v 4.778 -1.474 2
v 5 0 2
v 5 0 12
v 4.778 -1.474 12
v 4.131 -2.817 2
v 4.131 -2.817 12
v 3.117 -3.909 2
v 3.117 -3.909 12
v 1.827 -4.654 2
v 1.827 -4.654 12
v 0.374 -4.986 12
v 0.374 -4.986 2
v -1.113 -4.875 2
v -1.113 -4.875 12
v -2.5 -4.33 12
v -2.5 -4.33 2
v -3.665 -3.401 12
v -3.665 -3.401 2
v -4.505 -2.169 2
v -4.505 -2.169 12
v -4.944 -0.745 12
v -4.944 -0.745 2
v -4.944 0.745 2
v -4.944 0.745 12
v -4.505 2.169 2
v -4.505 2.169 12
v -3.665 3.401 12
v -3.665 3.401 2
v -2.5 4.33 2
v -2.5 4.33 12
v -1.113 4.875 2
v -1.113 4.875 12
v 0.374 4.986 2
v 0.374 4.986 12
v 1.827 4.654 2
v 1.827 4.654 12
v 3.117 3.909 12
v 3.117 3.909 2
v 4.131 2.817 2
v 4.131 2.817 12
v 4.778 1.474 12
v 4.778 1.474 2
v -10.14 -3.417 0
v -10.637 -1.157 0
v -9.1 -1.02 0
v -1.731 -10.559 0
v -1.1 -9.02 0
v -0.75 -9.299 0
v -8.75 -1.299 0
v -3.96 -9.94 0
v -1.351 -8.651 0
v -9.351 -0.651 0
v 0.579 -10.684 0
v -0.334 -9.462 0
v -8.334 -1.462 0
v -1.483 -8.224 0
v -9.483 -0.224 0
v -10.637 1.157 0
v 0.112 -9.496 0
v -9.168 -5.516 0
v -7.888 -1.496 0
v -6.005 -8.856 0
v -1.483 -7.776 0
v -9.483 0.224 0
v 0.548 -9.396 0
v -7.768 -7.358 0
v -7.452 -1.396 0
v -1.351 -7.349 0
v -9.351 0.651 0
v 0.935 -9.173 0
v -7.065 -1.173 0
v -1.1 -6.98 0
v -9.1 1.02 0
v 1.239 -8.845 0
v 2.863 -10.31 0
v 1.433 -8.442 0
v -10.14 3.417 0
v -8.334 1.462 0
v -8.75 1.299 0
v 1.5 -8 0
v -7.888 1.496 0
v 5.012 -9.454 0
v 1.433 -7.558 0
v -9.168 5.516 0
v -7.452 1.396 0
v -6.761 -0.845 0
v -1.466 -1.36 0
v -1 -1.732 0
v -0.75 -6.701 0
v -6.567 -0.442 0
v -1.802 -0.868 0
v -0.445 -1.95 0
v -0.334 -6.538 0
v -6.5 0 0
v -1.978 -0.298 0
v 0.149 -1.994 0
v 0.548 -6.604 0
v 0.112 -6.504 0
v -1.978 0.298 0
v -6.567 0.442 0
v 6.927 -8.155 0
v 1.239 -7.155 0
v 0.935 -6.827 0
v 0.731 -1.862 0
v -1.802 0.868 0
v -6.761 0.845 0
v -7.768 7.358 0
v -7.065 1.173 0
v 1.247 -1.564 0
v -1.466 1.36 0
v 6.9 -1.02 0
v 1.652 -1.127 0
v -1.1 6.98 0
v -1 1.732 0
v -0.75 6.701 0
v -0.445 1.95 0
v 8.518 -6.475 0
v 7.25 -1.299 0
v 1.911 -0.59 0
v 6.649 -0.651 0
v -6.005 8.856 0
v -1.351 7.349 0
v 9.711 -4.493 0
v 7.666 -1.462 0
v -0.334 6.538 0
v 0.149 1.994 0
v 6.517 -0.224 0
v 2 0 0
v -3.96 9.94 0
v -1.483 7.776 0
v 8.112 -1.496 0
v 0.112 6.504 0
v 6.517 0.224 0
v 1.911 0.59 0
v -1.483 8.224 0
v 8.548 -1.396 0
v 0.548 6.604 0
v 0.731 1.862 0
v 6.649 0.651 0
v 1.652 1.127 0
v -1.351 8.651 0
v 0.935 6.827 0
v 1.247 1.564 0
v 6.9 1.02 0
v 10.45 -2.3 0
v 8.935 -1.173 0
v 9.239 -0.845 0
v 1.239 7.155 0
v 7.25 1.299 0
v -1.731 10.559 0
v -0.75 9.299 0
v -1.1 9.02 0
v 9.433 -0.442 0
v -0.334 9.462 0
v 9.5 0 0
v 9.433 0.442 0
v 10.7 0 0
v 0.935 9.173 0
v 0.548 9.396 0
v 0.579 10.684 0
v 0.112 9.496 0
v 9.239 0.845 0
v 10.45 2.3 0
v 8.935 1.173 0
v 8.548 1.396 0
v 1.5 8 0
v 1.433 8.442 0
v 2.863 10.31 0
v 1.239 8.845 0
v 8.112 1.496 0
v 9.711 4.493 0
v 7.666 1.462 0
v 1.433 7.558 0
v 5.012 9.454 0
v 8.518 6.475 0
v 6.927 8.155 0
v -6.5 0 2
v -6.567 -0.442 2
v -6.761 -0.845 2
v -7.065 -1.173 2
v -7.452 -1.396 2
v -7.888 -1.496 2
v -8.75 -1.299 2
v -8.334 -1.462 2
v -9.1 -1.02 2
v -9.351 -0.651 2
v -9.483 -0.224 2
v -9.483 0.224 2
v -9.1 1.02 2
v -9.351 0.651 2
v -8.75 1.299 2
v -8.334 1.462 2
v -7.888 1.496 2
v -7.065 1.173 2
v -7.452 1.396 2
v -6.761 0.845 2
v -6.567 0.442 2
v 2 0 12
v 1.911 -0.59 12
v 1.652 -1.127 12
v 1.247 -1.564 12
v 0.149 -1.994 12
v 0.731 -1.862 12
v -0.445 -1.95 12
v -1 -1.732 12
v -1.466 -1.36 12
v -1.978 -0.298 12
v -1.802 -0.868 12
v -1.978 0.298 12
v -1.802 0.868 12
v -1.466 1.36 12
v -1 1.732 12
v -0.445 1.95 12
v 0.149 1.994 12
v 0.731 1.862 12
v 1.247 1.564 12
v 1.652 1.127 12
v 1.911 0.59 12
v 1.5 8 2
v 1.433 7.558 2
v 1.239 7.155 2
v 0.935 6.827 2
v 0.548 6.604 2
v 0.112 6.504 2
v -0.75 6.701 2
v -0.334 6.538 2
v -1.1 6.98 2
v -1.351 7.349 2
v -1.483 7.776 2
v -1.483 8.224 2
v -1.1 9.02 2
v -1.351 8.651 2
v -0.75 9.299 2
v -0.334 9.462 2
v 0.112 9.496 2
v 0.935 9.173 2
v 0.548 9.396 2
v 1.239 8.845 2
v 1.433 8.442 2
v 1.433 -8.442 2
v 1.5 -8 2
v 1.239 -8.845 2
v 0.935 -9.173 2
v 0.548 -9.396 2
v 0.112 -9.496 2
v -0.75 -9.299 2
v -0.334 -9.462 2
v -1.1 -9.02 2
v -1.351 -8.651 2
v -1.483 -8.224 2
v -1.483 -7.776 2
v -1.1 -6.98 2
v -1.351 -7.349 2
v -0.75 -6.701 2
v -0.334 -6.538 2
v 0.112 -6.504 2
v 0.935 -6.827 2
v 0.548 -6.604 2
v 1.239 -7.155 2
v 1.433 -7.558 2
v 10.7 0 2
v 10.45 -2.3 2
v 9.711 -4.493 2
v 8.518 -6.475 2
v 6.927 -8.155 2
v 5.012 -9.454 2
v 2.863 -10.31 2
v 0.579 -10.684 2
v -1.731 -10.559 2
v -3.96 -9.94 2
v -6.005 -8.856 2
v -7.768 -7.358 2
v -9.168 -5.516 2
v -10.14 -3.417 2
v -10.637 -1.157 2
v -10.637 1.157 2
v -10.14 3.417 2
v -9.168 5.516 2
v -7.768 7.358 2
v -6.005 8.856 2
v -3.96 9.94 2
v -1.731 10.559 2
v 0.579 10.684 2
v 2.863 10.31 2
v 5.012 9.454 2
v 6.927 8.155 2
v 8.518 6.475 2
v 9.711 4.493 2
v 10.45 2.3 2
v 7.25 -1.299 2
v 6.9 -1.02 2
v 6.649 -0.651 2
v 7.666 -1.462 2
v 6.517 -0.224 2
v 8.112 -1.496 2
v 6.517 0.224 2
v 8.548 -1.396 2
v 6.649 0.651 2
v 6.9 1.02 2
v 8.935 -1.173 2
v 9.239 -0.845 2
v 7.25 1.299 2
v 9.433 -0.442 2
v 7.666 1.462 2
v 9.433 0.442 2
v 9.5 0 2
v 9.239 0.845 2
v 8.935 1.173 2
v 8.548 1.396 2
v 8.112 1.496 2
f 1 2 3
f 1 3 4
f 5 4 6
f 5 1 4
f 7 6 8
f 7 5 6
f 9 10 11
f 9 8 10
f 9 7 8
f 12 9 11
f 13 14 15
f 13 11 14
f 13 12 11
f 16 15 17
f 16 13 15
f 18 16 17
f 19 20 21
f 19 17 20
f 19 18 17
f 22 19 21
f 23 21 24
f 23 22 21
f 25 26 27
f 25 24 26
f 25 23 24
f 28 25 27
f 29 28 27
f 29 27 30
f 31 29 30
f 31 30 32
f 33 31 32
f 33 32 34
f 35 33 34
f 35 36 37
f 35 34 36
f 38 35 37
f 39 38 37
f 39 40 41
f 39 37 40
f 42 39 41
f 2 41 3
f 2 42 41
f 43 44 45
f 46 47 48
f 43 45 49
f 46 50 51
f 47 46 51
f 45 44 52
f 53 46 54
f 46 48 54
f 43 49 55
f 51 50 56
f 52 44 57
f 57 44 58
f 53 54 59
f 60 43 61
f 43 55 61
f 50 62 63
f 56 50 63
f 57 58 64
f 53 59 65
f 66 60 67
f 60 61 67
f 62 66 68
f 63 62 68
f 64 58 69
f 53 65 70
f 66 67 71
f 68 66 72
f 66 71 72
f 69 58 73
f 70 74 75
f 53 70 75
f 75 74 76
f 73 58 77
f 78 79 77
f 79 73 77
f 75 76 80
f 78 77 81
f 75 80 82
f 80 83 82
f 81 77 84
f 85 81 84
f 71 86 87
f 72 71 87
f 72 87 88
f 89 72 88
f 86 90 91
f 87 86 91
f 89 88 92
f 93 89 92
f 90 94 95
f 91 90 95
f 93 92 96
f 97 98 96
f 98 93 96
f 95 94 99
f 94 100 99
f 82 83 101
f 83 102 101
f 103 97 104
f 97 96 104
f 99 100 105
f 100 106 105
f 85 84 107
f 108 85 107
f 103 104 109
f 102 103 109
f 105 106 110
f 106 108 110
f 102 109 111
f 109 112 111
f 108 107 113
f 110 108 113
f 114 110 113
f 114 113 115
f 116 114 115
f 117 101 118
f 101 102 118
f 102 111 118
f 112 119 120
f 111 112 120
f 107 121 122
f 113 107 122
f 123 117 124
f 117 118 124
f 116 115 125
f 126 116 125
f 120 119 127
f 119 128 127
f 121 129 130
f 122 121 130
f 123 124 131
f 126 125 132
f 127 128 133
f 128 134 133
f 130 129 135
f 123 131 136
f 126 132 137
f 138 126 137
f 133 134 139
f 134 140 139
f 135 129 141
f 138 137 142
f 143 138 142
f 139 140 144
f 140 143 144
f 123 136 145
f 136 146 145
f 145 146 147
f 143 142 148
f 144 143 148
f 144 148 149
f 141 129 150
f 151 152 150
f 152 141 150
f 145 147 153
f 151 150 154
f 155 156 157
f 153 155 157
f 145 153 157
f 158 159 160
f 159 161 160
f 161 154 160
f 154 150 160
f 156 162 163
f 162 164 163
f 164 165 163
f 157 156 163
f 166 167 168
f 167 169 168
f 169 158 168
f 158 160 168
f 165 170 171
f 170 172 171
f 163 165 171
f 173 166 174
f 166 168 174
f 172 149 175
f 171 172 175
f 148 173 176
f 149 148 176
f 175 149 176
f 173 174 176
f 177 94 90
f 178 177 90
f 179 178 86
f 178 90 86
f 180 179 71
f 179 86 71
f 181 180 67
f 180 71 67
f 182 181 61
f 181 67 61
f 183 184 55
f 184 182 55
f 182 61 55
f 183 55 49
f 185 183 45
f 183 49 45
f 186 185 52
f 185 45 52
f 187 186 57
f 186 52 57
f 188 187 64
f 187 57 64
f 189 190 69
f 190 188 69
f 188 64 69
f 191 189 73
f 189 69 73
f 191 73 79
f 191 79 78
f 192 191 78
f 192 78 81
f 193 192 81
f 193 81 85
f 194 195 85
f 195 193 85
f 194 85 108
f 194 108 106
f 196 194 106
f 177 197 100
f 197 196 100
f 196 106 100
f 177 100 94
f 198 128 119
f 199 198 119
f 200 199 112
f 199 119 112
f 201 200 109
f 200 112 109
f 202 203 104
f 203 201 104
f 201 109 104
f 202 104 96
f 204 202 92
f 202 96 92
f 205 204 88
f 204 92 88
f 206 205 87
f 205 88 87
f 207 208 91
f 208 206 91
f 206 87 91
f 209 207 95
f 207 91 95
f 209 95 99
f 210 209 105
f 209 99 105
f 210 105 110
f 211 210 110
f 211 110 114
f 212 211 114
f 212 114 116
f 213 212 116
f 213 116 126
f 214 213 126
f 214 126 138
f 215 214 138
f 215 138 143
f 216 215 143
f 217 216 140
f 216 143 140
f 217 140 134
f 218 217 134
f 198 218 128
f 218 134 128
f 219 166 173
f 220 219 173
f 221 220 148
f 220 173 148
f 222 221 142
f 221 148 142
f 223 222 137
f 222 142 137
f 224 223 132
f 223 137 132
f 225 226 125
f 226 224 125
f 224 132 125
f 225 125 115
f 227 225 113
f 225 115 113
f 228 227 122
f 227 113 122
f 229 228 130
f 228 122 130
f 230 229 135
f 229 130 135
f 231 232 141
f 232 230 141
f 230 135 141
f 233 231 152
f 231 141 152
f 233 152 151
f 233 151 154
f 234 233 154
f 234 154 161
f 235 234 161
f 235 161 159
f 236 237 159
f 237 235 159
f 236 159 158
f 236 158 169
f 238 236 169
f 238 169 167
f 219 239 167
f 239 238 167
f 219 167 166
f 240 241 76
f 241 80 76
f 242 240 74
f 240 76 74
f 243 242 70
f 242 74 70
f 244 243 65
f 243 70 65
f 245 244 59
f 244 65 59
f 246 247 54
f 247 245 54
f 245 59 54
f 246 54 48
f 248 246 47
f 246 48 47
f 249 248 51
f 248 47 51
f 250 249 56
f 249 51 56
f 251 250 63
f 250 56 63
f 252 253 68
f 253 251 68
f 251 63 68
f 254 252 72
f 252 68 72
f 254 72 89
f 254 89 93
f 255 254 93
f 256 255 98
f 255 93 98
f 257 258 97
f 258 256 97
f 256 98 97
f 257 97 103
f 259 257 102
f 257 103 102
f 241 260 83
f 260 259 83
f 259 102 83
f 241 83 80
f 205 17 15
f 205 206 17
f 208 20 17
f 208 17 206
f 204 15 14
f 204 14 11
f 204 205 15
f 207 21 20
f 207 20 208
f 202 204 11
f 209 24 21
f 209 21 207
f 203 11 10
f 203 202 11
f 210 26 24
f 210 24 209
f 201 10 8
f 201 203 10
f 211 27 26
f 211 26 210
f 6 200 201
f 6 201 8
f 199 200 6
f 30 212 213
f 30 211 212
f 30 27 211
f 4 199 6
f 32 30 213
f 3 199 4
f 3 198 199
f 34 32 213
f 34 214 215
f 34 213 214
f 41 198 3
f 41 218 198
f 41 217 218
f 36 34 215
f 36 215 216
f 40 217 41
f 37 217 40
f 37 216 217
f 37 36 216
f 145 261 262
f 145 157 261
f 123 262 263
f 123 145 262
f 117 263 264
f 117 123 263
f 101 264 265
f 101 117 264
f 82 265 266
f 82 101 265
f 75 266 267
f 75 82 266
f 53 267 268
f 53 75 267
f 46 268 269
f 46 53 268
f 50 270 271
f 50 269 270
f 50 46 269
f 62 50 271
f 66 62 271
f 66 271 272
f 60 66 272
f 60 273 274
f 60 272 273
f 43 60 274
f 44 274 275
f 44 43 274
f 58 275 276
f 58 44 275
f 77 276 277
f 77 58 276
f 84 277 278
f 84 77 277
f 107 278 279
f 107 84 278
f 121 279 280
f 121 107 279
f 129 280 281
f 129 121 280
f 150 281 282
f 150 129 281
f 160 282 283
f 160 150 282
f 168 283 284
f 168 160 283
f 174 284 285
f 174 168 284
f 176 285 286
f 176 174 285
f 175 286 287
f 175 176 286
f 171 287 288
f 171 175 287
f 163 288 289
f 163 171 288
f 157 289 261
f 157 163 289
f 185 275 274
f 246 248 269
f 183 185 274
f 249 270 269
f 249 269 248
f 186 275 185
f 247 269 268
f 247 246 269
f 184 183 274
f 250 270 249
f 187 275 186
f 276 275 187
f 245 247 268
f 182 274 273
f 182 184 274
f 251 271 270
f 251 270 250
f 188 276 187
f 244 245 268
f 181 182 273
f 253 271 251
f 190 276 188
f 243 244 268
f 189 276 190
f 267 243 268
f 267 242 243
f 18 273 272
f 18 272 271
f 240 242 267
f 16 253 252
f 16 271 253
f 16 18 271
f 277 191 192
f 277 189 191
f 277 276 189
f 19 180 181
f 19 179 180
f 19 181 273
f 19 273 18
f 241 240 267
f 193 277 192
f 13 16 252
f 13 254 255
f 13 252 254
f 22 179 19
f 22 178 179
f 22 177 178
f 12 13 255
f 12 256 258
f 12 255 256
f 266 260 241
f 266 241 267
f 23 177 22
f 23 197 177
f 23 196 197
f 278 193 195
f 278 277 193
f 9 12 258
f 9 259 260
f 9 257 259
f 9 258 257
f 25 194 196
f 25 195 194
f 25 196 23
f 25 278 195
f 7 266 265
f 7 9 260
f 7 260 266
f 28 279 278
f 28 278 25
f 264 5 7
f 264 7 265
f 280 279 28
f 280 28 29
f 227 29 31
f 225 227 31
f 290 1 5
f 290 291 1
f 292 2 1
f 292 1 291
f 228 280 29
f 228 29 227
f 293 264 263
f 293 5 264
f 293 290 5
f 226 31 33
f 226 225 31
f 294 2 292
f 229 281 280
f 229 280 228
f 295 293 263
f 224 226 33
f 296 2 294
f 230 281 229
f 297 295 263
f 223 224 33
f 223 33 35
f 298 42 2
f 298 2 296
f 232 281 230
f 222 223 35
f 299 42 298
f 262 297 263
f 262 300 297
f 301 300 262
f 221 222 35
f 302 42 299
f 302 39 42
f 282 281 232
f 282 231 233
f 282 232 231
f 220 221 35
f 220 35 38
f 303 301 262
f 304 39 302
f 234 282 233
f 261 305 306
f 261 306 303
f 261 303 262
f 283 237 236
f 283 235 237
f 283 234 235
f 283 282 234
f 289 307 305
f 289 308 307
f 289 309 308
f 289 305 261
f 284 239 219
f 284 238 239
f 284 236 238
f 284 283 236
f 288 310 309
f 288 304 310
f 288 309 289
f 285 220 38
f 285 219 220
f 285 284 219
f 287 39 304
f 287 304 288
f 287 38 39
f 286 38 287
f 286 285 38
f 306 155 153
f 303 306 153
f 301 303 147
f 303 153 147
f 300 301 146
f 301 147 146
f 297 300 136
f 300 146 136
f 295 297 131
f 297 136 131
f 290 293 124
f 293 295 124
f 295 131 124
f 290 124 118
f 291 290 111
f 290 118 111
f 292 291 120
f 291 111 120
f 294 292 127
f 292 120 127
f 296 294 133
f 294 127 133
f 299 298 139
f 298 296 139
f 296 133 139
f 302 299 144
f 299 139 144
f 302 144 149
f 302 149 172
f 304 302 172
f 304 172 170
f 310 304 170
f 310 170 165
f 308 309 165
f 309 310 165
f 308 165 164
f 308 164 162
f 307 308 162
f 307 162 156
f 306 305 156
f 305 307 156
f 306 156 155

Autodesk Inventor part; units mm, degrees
ref_plane "YZ Plane" through (0, 0, 0) normal (1, 0, 0) x (0, 1, 0)
ref_plane "XZ Plane" through (0, 0, 0) normal (0, 1, 0) x (-1, 0, 0)
ref_plane "XY Plane" through (0, 0, 0) normal (0, 0, 1) x (1, 0, 0)
sketch "Sketch1" plane through (0, 0, 0) normal (0, 0, 1) x (1, 0, 0)
  circle A0 centre (0, 0) radius 10.7 projected
  circle A1 centre (8, 0) radius 1.5 projected
  circle A2 centre (0, 8) radius 1.5 projected
  circle A3 centre (0, -8) radius 1.5 projected
  circle A4 centre (0, 0) radius 2 projected
  circle A5 centre (-8, 0) radius 1.5 projected
extrude "Extrusion1" add sketch "Sketch1" along normal blind 2
sketch "Sketch2" plane through (0, 0, 2) normal (0, 0, 1) x (1, 0, 0)
  circle A0 centre (0, 0) radius 2 projected
  circle A1 centre (0, 0) radius 5
  dimension "d2" = 10
extrude "Extrusion2" add sketch "Sketch2" along normal blind 10
properties part number "AcopleBrida4" material "Acero"
